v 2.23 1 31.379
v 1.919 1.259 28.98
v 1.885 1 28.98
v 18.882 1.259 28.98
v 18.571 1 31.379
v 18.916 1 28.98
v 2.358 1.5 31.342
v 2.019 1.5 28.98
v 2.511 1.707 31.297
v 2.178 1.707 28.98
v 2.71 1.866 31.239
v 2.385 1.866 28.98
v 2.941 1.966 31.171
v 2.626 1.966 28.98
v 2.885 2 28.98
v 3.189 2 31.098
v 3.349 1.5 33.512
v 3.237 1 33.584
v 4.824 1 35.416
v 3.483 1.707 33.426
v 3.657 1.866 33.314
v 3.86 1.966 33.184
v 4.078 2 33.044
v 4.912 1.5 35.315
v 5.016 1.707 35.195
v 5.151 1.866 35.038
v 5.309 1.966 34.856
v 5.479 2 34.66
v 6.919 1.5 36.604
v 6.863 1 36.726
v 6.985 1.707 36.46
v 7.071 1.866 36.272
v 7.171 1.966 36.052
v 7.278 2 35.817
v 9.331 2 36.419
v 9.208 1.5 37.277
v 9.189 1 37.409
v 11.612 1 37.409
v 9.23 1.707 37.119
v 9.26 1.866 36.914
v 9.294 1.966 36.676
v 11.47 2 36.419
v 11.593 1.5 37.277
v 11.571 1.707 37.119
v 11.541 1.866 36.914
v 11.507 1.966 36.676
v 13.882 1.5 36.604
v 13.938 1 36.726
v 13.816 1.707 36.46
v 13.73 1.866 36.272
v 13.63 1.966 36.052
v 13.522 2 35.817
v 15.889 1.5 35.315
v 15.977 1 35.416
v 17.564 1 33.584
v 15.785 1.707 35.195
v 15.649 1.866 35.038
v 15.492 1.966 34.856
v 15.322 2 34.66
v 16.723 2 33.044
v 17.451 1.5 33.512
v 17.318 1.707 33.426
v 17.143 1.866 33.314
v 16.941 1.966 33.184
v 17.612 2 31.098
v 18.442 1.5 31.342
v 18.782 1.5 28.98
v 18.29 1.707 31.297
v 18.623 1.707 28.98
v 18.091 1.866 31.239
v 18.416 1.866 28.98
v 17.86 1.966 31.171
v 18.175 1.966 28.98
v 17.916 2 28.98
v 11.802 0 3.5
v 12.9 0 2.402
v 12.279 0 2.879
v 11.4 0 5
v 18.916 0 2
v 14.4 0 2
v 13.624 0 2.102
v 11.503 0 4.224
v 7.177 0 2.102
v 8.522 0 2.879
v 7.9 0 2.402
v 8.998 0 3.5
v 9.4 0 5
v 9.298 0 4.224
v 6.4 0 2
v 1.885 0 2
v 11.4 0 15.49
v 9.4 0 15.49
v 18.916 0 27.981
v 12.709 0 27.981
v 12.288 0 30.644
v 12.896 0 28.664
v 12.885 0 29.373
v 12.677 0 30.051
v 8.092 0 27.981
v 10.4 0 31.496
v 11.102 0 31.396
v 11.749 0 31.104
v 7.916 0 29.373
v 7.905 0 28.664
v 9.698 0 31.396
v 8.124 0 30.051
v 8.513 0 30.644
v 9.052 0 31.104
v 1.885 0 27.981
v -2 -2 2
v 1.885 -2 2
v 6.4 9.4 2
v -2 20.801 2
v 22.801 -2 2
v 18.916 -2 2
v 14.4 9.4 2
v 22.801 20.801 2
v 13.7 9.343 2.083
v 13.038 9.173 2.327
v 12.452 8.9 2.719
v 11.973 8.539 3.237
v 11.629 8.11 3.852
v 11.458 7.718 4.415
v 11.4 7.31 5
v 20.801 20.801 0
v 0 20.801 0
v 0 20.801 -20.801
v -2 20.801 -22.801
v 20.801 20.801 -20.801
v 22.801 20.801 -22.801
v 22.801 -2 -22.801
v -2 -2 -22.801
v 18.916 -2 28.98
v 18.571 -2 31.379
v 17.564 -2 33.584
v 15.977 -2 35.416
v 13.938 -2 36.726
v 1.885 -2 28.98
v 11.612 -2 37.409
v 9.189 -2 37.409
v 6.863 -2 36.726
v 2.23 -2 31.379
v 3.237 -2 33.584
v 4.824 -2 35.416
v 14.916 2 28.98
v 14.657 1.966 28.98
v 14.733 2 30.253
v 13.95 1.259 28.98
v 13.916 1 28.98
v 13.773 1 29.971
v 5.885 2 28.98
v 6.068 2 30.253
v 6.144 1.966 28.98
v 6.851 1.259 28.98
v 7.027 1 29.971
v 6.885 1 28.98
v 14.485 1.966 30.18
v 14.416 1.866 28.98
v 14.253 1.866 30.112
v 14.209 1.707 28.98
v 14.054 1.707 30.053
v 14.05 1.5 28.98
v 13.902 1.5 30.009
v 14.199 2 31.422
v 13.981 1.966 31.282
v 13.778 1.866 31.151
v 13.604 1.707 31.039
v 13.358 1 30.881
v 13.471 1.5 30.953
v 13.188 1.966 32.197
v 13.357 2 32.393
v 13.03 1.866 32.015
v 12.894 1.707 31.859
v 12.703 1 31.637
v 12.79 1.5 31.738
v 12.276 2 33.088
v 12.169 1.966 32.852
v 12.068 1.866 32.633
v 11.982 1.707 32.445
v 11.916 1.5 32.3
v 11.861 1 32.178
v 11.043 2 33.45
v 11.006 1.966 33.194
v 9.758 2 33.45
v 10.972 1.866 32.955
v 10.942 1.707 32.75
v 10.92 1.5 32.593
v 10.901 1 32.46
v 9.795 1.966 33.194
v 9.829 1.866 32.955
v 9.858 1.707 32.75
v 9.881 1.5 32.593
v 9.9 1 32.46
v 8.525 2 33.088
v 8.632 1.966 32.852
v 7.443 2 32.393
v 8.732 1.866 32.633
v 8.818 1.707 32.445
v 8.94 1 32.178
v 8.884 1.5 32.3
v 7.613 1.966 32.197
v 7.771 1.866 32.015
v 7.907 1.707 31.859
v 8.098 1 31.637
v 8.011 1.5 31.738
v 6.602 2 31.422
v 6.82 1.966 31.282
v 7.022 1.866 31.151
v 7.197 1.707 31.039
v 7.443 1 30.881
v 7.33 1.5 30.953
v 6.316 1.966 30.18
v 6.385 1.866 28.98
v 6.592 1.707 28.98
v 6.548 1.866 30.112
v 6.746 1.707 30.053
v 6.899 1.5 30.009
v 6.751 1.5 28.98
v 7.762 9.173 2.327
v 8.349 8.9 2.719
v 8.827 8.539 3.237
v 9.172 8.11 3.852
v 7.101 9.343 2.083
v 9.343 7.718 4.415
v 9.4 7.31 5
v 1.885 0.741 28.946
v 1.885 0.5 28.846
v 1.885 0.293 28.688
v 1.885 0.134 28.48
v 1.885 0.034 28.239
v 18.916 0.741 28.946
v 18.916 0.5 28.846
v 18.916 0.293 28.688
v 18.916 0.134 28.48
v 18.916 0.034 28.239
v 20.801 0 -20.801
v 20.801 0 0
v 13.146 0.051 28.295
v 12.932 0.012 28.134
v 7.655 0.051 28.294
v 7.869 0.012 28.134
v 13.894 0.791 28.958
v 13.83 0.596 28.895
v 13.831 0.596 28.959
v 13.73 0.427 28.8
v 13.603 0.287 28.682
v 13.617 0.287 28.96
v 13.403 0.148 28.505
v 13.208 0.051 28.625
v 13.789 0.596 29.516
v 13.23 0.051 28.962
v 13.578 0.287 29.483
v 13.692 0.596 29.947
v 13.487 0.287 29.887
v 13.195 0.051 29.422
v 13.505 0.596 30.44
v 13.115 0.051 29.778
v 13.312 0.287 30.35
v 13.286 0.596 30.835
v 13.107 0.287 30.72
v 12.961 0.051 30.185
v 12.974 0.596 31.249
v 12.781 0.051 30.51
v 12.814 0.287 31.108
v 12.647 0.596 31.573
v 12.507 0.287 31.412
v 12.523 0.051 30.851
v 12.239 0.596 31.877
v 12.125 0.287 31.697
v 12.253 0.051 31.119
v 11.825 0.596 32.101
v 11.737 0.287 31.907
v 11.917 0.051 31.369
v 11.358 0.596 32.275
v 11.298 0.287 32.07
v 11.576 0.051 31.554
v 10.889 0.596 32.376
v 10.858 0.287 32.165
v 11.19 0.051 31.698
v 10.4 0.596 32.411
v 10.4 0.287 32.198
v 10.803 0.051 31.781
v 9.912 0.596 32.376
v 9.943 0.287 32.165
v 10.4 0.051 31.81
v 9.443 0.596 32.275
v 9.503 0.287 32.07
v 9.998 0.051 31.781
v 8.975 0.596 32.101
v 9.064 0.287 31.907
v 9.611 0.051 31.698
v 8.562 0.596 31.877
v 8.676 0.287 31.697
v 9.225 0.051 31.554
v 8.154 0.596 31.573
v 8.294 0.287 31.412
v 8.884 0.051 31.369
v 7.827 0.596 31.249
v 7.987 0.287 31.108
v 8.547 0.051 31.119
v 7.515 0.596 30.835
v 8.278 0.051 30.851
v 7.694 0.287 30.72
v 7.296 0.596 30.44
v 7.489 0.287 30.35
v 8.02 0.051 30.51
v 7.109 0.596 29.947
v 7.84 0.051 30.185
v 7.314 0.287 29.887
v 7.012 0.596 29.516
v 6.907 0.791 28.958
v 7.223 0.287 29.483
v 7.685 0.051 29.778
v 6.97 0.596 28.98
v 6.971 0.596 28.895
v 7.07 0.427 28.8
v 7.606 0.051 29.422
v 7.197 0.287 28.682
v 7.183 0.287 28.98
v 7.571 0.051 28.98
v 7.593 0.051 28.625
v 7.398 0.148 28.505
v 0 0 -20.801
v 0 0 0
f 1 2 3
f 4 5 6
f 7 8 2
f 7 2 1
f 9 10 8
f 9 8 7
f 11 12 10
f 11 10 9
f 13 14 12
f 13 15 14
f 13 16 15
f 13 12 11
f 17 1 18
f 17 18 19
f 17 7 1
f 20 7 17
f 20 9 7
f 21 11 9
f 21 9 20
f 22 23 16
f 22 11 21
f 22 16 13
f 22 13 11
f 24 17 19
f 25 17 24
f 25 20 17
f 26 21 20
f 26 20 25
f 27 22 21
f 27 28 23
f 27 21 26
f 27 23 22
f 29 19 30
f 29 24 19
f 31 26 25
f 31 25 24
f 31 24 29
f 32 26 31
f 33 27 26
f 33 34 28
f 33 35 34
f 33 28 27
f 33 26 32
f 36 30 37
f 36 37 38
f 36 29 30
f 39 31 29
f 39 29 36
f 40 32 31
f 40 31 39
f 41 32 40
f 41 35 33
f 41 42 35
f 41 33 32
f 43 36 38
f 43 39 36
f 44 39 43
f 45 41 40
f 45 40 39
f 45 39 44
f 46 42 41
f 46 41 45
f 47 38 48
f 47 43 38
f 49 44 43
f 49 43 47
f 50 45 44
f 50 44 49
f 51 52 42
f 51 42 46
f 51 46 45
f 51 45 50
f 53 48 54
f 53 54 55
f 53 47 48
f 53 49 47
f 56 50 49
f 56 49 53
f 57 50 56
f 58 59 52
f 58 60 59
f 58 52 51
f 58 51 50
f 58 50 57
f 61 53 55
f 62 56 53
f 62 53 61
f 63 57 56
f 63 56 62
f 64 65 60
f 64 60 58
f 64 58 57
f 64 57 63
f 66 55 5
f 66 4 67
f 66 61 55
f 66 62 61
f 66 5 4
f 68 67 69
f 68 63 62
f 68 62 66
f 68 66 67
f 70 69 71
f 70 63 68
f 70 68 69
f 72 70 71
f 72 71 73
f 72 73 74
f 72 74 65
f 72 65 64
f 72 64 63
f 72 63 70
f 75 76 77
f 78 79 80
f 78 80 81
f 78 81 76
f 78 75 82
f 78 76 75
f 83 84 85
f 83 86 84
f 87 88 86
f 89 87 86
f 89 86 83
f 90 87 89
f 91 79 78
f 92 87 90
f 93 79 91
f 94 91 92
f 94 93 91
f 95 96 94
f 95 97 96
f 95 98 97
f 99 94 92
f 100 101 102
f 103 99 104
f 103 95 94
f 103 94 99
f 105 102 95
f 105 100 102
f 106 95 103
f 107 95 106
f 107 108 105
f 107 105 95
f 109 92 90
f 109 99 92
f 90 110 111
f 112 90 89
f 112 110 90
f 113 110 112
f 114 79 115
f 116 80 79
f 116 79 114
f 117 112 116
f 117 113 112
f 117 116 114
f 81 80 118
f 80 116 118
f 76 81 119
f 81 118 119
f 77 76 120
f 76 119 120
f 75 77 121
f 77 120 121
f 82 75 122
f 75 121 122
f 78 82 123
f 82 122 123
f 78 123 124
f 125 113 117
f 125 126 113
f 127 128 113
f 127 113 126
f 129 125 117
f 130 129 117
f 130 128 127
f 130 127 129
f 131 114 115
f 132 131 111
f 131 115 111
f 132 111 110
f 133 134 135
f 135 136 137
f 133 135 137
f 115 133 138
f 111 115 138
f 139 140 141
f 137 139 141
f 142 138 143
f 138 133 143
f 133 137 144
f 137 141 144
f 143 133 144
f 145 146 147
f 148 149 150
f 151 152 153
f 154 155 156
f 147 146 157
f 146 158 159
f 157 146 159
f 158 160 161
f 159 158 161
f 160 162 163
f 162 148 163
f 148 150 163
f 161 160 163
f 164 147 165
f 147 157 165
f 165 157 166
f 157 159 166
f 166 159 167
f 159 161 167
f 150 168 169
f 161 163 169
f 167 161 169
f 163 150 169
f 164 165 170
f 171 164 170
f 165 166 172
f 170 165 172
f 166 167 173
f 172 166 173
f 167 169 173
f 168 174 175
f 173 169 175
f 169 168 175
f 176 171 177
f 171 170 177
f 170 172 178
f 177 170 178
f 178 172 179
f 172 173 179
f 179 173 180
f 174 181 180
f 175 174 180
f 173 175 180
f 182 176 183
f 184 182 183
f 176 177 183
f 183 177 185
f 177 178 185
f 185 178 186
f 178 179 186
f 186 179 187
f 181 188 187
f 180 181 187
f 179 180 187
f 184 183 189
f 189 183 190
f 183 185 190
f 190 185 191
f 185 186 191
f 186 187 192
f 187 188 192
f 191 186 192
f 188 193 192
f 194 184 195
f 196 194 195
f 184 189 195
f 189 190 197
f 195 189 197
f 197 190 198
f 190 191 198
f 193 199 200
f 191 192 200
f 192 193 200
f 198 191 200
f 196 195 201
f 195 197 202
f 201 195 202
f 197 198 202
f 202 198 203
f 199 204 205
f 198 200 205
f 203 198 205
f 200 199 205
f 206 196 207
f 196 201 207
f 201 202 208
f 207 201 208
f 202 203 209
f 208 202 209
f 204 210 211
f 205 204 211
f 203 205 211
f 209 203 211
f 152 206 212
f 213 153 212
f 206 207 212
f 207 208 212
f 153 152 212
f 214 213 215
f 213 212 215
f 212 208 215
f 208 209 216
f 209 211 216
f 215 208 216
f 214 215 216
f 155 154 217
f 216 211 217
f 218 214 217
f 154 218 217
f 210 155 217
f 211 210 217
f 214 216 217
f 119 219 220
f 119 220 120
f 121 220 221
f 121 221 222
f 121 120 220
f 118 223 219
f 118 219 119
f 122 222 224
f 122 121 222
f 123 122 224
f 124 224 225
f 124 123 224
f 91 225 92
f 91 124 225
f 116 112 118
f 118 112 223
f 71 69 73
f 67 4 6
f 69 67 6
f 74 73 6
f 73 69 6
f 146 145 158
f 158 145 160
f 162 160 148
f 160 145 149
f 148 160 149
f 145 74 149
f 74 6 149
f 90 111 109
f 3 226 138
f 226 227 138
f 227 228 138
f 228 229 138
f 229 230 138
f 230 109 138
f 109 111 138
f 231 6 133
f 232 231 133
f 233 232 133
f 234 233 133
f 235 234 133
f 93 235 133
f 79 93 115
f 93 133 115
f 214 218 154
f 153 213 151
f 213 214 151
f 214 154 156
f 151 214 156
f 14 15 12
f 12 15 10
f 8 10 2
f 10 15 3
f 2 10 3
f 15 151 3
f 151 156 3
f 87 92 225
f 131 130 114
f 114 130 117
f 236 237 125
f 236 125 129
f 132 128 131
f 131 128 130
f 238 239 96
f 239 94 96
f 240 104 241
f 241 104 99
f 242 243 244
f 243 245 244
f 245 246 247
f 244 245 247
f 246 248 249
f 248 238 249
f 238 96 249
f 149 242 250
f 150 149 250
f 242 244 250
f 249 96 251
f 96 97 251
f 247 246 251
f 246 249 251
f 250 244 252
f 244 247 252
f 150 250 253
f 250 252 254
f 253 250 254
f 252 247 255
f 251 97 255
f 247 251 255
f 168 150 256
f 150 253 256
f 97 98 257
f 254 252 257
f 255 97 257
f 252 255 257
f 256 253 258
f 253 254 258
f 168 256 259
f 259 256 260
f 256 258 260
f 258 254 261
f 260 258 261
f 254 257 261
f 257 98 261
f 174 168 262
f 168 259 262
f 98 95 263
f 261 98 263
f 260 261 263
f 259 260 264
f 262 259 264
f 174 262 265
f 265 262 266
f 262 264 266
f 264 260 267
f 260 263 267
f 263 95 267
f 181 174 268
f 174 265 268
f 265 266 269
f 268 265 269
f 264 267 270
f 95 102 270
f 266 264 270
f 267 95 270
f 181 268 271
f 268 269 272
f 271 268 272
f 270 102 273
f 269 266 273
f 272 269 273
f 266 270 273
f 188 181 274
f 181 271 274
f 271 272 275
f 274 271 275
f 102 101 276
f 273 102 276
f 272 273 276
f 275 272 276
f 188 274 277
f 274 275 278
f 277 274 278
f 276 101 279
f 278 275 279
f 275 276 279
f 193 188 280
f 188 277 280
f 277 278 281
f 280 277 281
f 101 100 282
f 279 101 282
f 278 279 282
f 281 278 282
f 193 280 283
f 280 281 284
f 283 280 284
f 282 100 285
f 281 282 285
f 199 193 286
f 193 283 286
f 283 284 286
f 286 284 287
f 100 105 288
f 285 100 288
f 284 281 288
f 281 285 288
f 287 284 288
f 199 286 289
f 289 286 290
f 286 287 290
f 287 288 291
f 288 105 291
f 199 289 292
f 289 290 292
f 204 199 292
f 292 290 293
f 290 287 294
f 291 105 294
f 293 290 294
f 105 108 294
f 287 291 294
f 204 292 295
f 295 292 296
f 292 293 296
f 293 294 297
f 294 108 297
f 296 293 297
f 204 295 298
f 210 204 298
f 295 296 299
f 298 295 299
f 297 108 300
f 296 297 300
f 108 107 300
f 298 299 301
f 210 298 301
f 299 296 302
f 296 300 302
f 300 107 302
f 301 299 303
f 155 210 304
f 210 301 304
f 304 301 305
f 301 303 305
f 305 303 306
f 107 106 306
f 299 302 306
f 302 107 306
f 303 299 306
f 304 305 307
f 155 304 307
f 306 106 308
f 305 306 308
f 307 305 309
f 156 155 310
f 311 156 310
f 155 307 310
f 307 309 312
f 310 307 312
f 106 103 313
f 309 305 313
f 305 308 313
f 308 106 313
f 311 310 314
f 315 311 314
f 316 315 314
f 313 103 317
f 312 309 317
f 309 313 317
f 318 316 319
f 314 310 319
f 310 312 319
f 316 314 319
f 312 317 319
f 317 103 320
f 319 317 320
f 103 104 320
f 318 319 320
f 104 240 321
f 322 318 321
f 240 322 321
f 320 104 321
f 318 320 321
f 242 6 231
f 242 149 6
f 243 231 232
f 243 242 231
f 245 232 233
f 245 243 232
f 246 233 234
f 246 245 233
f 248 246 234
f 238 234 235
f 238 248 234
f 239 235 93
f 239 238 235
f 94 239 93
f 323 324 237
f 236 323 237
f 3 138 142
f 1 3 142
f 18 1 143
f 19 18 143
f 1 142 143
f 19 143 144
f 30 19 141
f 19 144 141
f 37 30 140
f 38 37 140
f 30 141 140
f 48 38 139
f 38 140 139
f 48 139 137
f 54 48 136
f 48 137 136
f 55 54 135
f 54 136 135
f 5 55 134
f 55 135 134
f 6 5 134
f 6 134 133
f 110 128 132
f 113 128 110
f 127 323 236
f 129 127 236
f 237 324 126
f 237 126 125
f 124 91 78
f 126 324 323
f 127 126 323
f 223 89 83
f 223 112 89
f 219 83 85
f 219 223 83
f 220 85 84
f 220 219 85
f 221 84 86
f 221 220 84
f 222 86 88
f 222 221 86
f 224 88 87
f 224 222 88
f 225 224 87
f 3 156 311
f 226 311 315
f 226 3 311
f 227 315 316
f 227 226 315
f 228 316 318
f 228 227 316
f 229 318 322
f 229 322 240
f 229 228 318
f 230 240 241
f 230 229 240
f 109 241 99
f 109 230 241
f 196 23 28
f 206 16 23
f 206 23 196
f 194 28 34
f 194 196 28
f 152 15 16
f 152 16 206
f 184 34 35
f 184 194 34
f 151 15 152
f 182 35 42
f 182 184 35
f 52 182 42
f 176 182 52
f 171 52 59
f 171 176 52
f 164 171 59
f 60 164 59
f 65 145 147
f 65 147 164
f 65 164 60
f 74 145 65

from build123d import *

# Parameters (mm, degrees)
SKETCH1_W           = 24.80083823
SKETCH1_H           = 24.80083823
SKETCH1_W_2         = 20.80083823
SKETCH1_H_2         = 20.80083823
EXTRUDE_THIN1_DEPTH = 20.80083823
SKETCH2_W           = 24.80083823
SKETCH2_H           = 24.80083823
BOSS_EXTRUDE1_DEPTH = 2
BOSS_EXTRUDE2_DEPTH = 2
BOSS_EXTRUDE3_DEPTH = 1
FILLET2_R           = 3
EXTRUDE_THIN2_DEPTH = 2
FILLET3_R           = 1


with BuildPart() as part:
    # Sketch1 → Extrude-Thin1 (new body)
    with BuildSketch(Plane(origin=(0, 0, 0), x_dir=(1, 0, 0), z_dir=(0, 1, 0))):
        with Locations((10.400419115, 10.400419115)):
            Rectangle(SKETCH1_W, SKETCH1_H)
        with Locations((10.400419115, 10.400419115)):
            Rectangle(SKETCH1_W_2, SKETCH1_H_2, mode=Mode.SUBTRACT)
    extrude(amount=EXTRUDE_THIN1_DEPTH)

    # Sketch2 → Boss-Extrude1 (add)
    with BuildSketch(Plane.XZ):
        with Locations((10.400419115, -10.400419115)):
            Rectangle(SKETCH2_W, SKETCH2_H)
    extrude(amount=BOSS_EXTRUDE1_DEPTH)

    # Sketch4 → Boss-Extrude2 (add)
    with BuildSketch(Plane.XZ.offset(2)):
        with BuildLine():
            Line((1.884963608, 2), (1.884963608, 28.980417336))
            ThreePointArc((1.884963608, 28.980417336), (10.400419115, 37.495872843), (18.915874622, 28.980417336))
            Line((18.915874622, 28.980417336), (18.915874622, 2))
            ThreePointArc((18.915874622, 2), (10.400419115, -6.515455507), (1.884963608, 2))
        make_face()
    extrude(amount=-BOSS_EXTRUDE2_DEPTH)

    # Sketch5 → Boss-Extrude3 (add, symmetric)
    with BuildSketch(Plane(origin=(10.400419115, 0, 0), x_dir=(0, 0, -1), z_dir=(1, 0, 0))):
        Polygon((-2, 9.400419115), (-15.490208668, 0), (-2, 0), align=None)
    extrude(amount=BOSS_EXTRUDE3_DEPTH, both=True)

    # Fillet2
    fillet2_edges = [part.edges().sort_by_distance(p)[0] for p in [
        (9.400419115, 4.700209558, 2),
        (11.400419115, 4.700209558, 2),
    ]]
    fillet(fillet2_edges, radius=FILLET2_R)

    # Sketch6 → Extrude-Thin2 (add)
    with BuildSketch(Plane(origin=(0, 0, 0), x_dir=(1, 0, 0), z_dir=(0, 1, 0))):
        with BuildLine():
            ThreePointArc((1.884963608, -28.980417336), (10.400419115, -37.495872843), (18.915874622, -28.980417336))
            Line((18.915874622, -28.980417336), (13.915874622, -28.980417336))
            ThreePointArc((13.915874622, -28.980417336), (10.400419115, -32.495872843), (6.884963608, -28.980417336))
            Line((6.884963608, -28.980417336), (1.884963608, -28.980417336))
        make_face()
    extrude(amount=EXTRUDE_THIN2_DEPTH)

    # Fillet3
    fillet3_edges = [part.edges().sort_by_distance(p)[0] for p in [
        (16.415874622, 0, 28.980417336),
        (4.384963608, 0, 28.980417336),
        (10.400419115, 2, 37.495872843),
        (10.400419115, 2, 32.495872843),
        (10.400419115, 0, 32.495872843),
    ]]
    fillet(fillet3_edges, radius=FILLET3_R - 0.0001)  # a hair under: the kernel refuses the full size


solid = part.part
